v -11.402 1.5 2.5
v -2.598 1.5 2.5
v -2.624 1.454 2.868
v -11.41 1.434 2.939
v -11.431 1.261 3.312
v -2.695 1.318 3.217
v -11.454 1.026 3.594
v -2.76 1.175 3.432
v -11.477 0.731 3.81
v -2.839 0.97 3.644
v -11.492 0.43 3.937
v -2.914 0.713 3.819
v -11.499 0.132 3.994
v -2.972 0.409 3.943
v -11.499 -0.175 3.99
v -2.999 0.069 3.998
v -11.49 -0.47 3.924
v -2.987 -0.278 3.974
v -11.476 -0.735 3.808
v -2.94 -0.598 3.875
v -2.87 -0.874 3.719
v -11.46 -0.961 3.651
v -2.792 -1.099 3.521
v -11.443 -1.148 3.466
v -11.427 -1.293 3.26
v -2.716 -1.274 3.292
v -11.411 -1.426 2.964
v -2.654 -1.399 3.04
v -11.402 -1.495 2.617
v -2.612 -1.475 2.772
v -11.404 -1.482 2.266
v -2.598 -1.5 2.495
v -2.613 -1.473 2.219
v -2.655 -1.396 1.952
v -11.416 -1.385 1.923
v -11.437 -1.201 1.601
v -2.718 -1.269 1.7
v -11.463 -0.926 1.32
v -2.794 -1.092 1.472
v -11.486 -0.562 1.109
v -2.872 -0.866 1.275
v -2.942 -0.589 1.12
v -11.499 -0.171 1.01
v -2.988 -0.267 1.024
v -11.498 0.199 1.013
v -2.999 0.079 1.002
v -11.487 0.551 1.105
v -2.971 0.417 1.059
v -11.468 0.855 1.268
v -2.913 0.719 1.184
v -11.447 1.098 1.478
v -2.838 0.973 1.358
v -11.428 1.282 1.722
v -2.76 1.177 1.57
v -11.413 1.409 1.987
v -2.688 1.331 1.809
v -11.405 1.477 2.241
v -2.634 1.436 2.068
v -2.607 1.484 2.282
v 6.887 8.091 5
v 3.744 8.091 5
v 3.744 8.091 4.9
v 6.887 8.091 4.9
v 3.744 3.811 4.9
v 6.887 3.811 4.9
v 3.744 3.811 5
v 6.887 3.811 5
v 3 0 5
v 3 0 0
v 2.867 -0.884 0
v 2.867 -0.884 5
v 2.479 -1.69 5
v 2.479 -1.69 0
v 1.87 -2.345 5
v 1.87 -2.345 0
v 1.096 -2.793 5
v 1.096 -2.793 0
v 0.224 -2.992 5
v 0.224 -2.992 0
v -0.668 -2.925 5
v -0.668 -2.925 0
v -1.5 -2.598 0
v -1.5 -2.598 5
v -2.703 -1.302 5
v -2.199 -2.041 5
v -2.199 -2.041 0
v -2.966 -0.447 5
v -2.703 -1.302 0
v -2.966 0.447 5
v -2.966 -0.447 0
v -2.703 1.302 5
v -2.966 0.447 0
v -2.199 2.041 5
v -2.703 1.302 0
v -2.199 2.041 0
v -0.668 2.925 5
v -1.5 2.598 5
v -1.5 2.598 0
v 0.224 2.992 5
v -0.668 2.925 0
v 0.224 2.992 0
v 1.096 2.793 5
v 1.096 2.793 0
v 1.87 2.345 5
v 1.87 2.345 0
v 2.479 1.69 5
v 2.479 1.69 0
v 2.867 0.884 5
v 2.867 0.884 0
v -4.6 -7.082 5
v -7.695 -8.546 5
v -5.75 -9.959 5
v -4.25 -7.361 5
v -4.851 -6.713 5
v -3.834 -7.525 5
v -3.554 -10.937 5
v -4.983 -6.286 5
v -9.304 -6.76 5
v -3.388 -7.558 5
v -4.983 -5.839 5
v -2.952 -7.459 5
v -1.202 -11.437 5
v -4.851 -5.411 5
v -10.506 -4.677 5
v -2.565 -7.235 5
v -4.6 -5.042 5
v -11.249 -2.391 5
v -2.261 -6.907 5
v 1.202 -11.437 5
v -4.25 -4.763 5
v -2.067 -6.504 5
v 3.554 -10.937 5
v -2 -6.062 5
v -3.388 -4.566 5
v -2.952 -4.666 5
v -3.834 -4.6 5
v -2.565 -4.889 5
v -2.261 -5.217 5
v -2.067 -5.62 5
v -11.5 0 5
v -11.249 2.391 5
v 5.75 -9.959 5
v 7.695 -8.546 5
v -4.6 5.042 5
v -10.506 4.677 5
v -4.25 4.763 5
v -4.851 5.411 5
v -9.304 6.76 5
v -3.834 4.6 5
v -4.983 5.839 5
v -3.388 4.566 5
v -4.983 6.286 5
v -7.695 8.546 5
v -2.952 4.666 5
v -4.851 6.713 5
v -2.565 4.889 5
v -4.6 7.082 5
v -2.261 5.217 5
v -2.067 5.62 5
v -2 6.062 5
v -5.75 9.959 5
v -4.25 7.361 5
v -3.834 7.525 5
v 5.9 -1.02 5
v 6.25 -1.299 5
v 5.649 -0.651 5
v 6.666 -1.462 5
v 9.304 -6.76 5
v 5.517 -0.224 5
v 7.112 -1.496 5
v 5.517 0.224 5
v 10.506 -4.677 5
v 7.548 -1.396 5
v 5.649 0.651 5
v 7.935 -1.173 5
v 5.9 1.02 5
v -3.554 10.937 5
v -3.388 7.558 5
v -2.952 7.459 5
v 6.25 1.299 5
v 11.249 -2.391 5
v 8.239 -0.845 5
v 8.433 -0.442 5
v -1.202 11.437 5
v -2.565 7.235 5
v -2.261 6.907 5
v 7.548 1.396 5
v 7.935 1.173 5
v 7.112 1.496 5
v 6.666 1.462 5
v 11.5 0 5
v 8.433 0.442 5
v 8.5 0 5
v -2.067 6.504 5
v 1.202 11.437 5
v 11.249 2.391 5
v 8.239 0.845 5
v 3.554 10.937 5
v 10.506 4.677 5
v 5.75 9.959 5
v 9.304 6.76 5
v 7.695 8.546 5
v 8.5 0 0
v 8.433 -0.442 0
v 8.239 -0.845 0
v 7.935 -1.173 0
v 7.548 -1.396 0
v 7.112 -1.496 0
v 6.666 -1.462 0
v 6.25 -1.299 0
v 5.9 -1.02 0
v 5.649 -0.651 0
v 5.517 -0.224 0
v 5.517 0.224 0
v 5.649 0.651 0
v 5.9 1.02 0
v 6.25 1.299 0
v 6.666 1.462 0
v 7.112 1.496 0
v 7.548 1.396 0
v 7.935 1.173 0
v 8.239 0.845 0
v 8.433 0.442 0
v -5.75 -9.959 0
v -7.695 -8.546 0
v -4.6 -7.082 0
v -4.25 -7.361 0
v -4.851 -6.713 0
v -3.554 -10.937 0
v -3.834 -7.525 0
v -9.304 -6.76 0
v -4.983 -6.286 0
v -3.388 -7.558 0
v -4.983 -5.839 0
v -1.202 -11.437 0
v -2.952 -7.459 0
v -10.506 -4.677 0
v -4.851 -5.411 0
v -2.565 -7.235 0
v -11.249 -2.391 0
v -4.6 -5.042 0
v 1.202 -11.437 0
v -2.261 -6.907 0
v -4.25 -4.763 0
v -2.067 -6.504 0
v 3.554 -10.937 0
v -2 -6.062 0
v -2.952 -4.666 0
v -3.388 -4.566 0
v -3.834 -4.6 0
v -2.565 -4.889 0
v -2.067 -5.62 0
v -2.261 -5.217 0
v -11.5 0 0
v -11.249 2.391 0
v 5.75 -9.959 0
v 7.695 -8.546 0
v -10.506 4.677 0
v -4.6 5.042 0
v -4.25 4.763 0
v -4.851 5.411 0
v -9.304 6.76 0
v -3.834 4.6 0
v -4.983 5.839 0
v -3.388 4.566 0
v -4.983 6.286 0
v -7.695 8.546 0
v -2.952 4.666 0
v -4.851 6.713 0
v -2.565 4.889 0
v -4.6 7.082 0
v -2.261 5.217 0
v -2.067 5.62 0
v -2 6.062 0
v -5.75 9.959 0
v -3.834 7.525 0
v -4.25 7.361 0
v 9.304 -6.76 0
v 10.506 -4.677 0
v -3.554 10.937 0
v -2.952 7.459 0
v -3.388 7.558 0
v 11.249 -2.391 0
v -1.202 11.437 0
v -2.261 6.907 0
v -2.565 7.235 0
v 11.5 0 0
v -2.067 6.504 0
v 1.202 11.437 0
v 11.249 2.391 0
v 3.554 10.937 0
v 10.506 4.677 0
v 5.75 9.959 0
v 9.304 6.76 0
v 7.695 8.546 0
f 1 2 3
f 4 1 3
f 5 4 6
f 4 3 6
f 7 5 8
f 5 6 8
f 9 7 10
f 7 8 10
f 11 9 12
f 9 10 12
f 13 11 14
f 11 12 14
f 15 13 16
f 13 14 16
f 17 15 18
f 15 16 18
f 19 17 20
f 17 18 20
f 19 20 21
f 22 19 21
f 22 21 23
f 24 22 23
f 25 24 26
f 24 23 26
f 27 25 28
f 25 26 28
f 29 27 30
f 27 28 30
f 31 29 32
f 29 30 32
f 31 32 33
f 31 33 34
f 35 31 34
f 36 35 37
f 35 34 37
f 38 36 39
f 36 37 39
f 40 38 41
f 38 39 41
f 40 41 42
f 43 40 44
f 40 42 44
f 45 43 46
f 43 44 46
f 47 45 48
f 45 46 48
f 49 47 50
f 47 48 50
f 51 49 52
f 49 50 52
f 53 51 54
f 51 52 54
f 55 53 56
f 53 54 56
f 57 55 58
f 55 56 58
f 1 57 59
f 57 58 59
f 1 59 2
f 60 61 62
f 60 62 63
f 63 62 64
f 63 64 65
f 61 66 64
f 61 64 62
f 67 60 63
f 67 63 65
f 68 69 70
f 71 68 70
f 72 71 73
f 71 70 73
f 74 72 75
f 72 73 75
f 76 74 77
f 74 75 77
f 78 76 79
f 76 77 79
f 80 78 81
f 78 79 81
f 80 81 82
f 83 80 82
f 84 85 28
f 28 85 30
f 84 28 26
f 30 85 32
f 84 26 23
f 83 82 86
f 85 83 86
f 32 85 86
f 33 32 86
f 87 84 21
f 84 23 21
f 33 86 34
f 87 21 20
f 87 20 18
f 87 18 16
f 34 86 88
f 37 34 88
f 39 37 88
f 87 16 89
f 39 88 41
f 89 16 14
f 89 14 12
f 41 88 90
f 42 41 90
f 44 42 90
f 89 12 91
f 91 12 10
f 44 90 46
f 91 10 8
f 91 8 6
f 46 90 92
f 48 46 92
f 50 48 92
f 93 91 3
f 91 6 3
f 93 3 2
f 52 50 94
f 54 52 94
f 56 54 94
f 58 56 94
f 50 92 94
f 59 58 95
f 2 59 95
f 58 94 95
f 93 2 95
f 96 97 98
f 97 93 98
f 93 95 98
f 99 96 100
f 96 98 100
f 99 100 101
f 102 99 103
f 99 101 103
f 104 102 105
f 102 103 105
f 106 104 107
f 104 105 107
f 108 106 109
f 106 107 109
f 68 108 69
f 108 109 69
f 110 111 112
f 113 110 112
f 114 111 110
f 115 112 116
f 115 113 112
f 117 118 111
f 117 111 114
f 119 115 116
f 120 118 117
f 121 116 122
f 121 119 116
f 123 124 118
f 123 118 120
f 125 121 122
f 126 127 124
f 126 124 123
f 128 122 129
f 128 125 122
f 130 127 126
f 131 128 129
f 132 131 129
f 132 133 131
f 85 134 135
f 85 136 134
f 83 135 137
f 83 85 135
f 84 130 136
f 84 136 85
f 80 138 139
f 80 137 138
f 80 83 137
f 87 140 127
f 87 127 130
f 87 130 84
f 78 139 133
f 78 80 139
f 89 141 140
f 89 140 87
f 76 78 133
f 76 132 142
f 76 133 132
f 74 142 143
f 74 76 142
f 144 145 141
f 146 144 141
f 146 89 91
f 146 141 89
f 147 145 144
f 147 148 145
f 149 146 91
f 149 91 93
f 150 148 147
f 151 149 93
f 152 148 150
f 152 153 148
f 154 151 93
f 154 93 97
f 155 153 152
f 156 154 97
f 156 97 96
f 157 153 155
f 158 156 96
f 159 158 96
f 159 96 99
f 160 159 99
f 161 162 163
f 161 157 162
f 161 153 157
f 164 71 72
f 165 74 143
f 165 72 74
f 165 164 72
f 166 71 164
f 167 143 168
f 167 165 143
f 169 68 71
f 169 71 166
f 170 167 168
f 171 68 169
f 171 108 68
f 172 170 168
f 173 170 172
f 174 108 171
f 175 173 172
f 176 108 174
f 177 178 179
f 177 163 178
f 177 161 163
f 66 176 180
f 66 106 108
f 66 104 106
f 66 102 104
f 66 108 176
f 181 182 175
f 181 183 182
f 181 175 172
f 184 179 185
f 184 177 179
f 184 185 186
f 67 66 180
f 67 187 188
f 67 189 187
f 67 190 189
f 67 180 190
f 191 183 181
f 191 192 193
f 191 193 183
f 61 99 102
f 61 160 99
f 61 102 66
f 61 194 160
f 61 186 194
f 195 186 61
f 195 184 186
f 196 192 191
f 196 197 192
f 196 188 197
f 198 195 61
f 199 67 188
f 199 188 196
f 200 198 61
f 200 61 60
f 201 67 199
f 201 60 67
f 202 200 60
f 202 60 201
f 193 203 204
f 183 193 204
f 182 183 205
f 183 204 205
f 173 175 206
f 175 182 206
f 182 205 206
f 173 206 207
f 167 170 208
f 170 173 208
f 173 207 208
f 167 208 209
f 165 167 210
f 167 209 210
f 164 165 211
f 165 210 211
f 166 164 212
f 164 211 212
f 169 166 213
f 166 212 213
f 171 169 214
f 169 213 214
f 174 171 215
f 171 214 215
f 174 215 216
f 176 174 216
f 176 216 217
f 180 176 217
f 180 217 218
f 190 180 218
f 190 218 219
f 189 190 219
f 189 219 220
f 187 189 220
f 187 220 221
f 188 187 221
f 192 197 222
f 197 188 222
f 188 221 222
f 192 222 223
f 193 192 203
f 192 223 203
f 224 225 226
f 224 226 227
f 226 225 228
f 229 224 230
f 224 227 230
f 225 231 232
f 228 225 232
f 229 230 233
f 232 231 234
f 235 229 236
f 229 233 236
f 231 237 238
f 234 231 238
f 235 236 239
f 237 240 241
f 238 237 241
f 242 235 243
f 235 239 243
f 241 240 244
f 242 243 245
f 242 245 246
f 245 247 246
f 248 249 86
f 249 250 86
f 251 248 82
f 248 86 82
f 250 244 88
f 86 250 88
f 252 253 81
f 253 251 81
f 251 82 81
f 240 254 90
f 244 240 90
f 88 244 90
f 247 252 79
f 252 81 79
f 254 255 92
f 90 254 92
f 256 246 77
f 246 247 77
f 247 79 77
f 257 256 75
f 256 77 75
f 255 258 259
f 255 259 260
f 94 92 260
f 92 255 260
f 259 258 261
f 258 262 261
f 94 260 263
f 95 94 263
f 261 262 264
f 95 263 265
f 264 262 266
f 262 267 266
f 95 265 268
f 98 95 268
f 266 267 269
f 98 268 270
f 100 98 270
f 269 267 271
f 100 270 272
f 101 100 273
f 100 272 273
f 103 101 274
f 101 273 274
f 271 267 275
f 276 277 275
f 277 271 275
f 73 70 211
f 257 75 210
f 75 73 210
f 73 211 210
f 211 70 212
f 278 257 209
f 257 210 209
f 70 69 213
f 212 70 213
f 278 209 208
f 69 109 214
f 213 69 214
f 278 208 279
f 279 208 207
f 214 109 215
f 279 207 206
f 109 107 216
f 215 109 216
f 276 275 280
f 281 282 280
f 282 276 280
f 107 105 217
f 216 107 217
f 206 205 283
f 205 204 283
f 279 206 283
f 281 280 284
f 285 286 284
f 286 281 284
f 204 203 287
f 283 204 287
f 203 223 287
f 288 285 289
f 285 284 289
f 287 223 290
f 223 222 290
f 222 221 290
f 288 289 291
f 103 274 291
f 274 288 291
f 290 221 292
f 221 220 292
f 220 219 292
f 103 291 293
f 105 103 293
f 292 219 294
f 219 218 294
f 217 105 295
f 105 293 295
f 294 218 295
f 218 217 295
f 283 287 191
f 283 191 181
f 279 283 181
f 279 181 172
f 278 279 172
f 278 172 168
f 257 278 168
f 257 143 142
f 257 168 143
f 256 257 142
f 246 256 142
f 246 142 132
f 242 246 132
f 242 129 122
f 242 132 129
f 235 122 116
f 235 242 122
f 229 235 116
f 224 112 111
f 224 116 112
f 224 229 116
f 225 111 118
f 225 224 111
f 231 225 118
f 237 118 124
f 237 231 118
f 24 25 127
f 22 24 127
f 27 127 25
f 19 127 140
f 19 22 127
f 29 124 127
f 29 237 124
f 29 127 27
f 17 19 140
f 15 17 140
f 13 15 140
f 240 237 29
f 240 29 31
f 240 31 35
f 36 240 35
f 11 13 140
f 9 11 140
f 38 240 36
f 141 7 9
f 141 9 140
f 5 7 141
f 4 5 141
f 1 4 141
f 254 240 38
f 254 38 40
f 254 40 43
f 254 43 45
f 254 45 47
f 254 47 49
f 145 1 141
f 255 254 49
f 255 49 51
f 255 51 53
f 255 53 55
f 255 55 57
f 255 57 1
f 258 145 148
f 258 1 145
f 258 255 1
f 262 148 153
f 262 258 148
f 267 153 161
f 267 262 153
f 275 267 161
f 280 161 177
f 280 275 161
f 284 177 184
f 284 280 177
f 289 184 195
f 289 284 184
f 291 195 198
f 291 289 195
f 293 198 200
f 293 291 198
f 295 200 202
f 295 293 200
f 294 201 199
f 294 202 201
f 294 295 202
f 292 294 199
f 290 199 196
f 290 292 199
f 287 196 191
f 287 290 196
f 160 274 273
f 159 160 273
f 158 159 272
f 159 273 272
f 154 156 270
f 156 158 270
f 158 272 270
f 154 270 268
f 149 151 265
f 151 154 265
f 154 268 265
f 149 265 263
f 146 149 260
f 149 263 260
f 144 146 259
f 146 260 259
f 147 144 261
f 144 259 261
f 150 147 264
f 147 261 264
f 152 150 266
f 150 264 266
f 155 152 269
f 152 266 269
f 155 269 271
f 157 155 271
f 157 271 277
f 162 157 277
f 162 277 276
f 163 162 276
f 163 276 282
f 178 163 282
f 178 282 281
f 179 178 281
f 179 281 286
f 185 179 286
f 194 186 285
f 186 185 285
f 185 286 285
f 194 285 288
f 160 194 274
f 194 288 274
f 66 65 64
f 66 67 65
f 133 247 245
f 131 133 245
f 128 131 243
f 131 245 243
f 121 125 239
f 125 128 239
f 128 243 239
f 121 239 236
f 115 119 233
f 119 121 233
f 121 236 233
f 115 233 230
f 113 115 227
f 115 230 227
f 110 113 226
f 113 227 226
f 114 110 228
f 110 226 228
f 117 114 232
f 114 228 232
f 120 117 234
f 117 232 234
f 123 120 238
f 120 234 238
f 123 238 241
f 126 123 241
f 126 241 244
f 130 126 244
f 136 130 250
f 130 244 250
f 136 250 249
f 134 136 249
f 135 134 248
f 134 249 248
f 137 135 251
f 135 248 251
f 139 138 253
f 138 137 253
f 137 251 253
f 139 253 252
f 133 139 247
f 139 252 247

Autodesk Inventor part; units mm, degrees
ref_plane "YZ Plane" through (0, 0, 0) normal (1, 0, 0) x (0, 1, 0)
ref_plane "XZ Plane" through (0, 0, 0) normal (0, 1, 0) x (-1, 0, 0)
ref_plane "XY Plane" through (0, 0, 0) normal (0, 0, 1) x (1, 0, 0)
sketch "Sketch3" plane through (0, 0, 0) normal (0, 0, 1) x (1, 0, 0)
  circle A0 centre (0, 0) radius 11.5
  circle A1 centre (0, 0) radius 3
  circle A2 centre (7, 0) radius 1.5
  circle A3 centre (3.5, 6.0622) radius 1.5
  circle A4 centre (-3.5, 6.0622) radius 1.5
  circle A5 centre (-7, 0) radius 1.5
  circle A6 centre (-3.5, -6.0622) radius 1.5
  circle A7 centre (3.5, -6.0622) radius 1.5
  dimension "d0" = 23
  dimension "d1" = 6
  dimension "d4" = 3
  dimension "d5" = 7
  dimension "d12" = 360
extrude "Extrusion1" add sketch "Sketch3" along normal blind 5 contours A0 | A3 | A5 | A7
sketch "Sketch4" plane through (0, 0, 0) normal (1, 0, 0) x (0, 1, 0)
  line L0 (-11.5, 0) -> (11.5, 0) projected
  line L1 (-3, 5) -> (3, 5) projected
  line L2 (3, 0) -> (-3, 0) projected
  circle A0 centre (0, 2.5) radius 1.5
  line L3 (3, 0) -> (3, 5) projected
  point P0 (0, 0)
  point P1 (0, 0)
  point P2 (3, 2.5)
  dimension "d14" = 3
extrude "Extrusion2" cut sketch "Sketch4" against normal through all
thread "Thread1" size "M3x0.5" class "6H" standard "ANSI Metric M Profile" full length
thread "Thread2" size "M3x0.5" class "6H" standard "ANSI Metric M Profile" full length
thread "Thread3" size "M3x0.5" class "6H" standard "ANSI Metric M Profile" full length
thread "Thread4" size "M3x0.5" class "6H" standard "ANSI Metric M Profile" full length
sketch "Sketch5" plane through (0, 0, 5) normal (0, 0, 1) x (1, 0, 0)
  line L0 (3.7445, 8.0908) -> (6.8872, 8.0908)
  line L1 (6.8872, 8.0908) -> (6.8872, 3.8114)
  line L2 (6.8872, 3.8114) -> (3.7445, 3.8114)
  line L3 (3.7445, 3.8114) -> (3.7445, 8.0908)
  point P0 (0, 0)
extrude "Extrusion3" cut sketch "Sketch5" against normal blind 0.1
equation "\"d15\" = d14"
properties part number "6mm Mounting Hub, thin" material "Aluminum 6061"
